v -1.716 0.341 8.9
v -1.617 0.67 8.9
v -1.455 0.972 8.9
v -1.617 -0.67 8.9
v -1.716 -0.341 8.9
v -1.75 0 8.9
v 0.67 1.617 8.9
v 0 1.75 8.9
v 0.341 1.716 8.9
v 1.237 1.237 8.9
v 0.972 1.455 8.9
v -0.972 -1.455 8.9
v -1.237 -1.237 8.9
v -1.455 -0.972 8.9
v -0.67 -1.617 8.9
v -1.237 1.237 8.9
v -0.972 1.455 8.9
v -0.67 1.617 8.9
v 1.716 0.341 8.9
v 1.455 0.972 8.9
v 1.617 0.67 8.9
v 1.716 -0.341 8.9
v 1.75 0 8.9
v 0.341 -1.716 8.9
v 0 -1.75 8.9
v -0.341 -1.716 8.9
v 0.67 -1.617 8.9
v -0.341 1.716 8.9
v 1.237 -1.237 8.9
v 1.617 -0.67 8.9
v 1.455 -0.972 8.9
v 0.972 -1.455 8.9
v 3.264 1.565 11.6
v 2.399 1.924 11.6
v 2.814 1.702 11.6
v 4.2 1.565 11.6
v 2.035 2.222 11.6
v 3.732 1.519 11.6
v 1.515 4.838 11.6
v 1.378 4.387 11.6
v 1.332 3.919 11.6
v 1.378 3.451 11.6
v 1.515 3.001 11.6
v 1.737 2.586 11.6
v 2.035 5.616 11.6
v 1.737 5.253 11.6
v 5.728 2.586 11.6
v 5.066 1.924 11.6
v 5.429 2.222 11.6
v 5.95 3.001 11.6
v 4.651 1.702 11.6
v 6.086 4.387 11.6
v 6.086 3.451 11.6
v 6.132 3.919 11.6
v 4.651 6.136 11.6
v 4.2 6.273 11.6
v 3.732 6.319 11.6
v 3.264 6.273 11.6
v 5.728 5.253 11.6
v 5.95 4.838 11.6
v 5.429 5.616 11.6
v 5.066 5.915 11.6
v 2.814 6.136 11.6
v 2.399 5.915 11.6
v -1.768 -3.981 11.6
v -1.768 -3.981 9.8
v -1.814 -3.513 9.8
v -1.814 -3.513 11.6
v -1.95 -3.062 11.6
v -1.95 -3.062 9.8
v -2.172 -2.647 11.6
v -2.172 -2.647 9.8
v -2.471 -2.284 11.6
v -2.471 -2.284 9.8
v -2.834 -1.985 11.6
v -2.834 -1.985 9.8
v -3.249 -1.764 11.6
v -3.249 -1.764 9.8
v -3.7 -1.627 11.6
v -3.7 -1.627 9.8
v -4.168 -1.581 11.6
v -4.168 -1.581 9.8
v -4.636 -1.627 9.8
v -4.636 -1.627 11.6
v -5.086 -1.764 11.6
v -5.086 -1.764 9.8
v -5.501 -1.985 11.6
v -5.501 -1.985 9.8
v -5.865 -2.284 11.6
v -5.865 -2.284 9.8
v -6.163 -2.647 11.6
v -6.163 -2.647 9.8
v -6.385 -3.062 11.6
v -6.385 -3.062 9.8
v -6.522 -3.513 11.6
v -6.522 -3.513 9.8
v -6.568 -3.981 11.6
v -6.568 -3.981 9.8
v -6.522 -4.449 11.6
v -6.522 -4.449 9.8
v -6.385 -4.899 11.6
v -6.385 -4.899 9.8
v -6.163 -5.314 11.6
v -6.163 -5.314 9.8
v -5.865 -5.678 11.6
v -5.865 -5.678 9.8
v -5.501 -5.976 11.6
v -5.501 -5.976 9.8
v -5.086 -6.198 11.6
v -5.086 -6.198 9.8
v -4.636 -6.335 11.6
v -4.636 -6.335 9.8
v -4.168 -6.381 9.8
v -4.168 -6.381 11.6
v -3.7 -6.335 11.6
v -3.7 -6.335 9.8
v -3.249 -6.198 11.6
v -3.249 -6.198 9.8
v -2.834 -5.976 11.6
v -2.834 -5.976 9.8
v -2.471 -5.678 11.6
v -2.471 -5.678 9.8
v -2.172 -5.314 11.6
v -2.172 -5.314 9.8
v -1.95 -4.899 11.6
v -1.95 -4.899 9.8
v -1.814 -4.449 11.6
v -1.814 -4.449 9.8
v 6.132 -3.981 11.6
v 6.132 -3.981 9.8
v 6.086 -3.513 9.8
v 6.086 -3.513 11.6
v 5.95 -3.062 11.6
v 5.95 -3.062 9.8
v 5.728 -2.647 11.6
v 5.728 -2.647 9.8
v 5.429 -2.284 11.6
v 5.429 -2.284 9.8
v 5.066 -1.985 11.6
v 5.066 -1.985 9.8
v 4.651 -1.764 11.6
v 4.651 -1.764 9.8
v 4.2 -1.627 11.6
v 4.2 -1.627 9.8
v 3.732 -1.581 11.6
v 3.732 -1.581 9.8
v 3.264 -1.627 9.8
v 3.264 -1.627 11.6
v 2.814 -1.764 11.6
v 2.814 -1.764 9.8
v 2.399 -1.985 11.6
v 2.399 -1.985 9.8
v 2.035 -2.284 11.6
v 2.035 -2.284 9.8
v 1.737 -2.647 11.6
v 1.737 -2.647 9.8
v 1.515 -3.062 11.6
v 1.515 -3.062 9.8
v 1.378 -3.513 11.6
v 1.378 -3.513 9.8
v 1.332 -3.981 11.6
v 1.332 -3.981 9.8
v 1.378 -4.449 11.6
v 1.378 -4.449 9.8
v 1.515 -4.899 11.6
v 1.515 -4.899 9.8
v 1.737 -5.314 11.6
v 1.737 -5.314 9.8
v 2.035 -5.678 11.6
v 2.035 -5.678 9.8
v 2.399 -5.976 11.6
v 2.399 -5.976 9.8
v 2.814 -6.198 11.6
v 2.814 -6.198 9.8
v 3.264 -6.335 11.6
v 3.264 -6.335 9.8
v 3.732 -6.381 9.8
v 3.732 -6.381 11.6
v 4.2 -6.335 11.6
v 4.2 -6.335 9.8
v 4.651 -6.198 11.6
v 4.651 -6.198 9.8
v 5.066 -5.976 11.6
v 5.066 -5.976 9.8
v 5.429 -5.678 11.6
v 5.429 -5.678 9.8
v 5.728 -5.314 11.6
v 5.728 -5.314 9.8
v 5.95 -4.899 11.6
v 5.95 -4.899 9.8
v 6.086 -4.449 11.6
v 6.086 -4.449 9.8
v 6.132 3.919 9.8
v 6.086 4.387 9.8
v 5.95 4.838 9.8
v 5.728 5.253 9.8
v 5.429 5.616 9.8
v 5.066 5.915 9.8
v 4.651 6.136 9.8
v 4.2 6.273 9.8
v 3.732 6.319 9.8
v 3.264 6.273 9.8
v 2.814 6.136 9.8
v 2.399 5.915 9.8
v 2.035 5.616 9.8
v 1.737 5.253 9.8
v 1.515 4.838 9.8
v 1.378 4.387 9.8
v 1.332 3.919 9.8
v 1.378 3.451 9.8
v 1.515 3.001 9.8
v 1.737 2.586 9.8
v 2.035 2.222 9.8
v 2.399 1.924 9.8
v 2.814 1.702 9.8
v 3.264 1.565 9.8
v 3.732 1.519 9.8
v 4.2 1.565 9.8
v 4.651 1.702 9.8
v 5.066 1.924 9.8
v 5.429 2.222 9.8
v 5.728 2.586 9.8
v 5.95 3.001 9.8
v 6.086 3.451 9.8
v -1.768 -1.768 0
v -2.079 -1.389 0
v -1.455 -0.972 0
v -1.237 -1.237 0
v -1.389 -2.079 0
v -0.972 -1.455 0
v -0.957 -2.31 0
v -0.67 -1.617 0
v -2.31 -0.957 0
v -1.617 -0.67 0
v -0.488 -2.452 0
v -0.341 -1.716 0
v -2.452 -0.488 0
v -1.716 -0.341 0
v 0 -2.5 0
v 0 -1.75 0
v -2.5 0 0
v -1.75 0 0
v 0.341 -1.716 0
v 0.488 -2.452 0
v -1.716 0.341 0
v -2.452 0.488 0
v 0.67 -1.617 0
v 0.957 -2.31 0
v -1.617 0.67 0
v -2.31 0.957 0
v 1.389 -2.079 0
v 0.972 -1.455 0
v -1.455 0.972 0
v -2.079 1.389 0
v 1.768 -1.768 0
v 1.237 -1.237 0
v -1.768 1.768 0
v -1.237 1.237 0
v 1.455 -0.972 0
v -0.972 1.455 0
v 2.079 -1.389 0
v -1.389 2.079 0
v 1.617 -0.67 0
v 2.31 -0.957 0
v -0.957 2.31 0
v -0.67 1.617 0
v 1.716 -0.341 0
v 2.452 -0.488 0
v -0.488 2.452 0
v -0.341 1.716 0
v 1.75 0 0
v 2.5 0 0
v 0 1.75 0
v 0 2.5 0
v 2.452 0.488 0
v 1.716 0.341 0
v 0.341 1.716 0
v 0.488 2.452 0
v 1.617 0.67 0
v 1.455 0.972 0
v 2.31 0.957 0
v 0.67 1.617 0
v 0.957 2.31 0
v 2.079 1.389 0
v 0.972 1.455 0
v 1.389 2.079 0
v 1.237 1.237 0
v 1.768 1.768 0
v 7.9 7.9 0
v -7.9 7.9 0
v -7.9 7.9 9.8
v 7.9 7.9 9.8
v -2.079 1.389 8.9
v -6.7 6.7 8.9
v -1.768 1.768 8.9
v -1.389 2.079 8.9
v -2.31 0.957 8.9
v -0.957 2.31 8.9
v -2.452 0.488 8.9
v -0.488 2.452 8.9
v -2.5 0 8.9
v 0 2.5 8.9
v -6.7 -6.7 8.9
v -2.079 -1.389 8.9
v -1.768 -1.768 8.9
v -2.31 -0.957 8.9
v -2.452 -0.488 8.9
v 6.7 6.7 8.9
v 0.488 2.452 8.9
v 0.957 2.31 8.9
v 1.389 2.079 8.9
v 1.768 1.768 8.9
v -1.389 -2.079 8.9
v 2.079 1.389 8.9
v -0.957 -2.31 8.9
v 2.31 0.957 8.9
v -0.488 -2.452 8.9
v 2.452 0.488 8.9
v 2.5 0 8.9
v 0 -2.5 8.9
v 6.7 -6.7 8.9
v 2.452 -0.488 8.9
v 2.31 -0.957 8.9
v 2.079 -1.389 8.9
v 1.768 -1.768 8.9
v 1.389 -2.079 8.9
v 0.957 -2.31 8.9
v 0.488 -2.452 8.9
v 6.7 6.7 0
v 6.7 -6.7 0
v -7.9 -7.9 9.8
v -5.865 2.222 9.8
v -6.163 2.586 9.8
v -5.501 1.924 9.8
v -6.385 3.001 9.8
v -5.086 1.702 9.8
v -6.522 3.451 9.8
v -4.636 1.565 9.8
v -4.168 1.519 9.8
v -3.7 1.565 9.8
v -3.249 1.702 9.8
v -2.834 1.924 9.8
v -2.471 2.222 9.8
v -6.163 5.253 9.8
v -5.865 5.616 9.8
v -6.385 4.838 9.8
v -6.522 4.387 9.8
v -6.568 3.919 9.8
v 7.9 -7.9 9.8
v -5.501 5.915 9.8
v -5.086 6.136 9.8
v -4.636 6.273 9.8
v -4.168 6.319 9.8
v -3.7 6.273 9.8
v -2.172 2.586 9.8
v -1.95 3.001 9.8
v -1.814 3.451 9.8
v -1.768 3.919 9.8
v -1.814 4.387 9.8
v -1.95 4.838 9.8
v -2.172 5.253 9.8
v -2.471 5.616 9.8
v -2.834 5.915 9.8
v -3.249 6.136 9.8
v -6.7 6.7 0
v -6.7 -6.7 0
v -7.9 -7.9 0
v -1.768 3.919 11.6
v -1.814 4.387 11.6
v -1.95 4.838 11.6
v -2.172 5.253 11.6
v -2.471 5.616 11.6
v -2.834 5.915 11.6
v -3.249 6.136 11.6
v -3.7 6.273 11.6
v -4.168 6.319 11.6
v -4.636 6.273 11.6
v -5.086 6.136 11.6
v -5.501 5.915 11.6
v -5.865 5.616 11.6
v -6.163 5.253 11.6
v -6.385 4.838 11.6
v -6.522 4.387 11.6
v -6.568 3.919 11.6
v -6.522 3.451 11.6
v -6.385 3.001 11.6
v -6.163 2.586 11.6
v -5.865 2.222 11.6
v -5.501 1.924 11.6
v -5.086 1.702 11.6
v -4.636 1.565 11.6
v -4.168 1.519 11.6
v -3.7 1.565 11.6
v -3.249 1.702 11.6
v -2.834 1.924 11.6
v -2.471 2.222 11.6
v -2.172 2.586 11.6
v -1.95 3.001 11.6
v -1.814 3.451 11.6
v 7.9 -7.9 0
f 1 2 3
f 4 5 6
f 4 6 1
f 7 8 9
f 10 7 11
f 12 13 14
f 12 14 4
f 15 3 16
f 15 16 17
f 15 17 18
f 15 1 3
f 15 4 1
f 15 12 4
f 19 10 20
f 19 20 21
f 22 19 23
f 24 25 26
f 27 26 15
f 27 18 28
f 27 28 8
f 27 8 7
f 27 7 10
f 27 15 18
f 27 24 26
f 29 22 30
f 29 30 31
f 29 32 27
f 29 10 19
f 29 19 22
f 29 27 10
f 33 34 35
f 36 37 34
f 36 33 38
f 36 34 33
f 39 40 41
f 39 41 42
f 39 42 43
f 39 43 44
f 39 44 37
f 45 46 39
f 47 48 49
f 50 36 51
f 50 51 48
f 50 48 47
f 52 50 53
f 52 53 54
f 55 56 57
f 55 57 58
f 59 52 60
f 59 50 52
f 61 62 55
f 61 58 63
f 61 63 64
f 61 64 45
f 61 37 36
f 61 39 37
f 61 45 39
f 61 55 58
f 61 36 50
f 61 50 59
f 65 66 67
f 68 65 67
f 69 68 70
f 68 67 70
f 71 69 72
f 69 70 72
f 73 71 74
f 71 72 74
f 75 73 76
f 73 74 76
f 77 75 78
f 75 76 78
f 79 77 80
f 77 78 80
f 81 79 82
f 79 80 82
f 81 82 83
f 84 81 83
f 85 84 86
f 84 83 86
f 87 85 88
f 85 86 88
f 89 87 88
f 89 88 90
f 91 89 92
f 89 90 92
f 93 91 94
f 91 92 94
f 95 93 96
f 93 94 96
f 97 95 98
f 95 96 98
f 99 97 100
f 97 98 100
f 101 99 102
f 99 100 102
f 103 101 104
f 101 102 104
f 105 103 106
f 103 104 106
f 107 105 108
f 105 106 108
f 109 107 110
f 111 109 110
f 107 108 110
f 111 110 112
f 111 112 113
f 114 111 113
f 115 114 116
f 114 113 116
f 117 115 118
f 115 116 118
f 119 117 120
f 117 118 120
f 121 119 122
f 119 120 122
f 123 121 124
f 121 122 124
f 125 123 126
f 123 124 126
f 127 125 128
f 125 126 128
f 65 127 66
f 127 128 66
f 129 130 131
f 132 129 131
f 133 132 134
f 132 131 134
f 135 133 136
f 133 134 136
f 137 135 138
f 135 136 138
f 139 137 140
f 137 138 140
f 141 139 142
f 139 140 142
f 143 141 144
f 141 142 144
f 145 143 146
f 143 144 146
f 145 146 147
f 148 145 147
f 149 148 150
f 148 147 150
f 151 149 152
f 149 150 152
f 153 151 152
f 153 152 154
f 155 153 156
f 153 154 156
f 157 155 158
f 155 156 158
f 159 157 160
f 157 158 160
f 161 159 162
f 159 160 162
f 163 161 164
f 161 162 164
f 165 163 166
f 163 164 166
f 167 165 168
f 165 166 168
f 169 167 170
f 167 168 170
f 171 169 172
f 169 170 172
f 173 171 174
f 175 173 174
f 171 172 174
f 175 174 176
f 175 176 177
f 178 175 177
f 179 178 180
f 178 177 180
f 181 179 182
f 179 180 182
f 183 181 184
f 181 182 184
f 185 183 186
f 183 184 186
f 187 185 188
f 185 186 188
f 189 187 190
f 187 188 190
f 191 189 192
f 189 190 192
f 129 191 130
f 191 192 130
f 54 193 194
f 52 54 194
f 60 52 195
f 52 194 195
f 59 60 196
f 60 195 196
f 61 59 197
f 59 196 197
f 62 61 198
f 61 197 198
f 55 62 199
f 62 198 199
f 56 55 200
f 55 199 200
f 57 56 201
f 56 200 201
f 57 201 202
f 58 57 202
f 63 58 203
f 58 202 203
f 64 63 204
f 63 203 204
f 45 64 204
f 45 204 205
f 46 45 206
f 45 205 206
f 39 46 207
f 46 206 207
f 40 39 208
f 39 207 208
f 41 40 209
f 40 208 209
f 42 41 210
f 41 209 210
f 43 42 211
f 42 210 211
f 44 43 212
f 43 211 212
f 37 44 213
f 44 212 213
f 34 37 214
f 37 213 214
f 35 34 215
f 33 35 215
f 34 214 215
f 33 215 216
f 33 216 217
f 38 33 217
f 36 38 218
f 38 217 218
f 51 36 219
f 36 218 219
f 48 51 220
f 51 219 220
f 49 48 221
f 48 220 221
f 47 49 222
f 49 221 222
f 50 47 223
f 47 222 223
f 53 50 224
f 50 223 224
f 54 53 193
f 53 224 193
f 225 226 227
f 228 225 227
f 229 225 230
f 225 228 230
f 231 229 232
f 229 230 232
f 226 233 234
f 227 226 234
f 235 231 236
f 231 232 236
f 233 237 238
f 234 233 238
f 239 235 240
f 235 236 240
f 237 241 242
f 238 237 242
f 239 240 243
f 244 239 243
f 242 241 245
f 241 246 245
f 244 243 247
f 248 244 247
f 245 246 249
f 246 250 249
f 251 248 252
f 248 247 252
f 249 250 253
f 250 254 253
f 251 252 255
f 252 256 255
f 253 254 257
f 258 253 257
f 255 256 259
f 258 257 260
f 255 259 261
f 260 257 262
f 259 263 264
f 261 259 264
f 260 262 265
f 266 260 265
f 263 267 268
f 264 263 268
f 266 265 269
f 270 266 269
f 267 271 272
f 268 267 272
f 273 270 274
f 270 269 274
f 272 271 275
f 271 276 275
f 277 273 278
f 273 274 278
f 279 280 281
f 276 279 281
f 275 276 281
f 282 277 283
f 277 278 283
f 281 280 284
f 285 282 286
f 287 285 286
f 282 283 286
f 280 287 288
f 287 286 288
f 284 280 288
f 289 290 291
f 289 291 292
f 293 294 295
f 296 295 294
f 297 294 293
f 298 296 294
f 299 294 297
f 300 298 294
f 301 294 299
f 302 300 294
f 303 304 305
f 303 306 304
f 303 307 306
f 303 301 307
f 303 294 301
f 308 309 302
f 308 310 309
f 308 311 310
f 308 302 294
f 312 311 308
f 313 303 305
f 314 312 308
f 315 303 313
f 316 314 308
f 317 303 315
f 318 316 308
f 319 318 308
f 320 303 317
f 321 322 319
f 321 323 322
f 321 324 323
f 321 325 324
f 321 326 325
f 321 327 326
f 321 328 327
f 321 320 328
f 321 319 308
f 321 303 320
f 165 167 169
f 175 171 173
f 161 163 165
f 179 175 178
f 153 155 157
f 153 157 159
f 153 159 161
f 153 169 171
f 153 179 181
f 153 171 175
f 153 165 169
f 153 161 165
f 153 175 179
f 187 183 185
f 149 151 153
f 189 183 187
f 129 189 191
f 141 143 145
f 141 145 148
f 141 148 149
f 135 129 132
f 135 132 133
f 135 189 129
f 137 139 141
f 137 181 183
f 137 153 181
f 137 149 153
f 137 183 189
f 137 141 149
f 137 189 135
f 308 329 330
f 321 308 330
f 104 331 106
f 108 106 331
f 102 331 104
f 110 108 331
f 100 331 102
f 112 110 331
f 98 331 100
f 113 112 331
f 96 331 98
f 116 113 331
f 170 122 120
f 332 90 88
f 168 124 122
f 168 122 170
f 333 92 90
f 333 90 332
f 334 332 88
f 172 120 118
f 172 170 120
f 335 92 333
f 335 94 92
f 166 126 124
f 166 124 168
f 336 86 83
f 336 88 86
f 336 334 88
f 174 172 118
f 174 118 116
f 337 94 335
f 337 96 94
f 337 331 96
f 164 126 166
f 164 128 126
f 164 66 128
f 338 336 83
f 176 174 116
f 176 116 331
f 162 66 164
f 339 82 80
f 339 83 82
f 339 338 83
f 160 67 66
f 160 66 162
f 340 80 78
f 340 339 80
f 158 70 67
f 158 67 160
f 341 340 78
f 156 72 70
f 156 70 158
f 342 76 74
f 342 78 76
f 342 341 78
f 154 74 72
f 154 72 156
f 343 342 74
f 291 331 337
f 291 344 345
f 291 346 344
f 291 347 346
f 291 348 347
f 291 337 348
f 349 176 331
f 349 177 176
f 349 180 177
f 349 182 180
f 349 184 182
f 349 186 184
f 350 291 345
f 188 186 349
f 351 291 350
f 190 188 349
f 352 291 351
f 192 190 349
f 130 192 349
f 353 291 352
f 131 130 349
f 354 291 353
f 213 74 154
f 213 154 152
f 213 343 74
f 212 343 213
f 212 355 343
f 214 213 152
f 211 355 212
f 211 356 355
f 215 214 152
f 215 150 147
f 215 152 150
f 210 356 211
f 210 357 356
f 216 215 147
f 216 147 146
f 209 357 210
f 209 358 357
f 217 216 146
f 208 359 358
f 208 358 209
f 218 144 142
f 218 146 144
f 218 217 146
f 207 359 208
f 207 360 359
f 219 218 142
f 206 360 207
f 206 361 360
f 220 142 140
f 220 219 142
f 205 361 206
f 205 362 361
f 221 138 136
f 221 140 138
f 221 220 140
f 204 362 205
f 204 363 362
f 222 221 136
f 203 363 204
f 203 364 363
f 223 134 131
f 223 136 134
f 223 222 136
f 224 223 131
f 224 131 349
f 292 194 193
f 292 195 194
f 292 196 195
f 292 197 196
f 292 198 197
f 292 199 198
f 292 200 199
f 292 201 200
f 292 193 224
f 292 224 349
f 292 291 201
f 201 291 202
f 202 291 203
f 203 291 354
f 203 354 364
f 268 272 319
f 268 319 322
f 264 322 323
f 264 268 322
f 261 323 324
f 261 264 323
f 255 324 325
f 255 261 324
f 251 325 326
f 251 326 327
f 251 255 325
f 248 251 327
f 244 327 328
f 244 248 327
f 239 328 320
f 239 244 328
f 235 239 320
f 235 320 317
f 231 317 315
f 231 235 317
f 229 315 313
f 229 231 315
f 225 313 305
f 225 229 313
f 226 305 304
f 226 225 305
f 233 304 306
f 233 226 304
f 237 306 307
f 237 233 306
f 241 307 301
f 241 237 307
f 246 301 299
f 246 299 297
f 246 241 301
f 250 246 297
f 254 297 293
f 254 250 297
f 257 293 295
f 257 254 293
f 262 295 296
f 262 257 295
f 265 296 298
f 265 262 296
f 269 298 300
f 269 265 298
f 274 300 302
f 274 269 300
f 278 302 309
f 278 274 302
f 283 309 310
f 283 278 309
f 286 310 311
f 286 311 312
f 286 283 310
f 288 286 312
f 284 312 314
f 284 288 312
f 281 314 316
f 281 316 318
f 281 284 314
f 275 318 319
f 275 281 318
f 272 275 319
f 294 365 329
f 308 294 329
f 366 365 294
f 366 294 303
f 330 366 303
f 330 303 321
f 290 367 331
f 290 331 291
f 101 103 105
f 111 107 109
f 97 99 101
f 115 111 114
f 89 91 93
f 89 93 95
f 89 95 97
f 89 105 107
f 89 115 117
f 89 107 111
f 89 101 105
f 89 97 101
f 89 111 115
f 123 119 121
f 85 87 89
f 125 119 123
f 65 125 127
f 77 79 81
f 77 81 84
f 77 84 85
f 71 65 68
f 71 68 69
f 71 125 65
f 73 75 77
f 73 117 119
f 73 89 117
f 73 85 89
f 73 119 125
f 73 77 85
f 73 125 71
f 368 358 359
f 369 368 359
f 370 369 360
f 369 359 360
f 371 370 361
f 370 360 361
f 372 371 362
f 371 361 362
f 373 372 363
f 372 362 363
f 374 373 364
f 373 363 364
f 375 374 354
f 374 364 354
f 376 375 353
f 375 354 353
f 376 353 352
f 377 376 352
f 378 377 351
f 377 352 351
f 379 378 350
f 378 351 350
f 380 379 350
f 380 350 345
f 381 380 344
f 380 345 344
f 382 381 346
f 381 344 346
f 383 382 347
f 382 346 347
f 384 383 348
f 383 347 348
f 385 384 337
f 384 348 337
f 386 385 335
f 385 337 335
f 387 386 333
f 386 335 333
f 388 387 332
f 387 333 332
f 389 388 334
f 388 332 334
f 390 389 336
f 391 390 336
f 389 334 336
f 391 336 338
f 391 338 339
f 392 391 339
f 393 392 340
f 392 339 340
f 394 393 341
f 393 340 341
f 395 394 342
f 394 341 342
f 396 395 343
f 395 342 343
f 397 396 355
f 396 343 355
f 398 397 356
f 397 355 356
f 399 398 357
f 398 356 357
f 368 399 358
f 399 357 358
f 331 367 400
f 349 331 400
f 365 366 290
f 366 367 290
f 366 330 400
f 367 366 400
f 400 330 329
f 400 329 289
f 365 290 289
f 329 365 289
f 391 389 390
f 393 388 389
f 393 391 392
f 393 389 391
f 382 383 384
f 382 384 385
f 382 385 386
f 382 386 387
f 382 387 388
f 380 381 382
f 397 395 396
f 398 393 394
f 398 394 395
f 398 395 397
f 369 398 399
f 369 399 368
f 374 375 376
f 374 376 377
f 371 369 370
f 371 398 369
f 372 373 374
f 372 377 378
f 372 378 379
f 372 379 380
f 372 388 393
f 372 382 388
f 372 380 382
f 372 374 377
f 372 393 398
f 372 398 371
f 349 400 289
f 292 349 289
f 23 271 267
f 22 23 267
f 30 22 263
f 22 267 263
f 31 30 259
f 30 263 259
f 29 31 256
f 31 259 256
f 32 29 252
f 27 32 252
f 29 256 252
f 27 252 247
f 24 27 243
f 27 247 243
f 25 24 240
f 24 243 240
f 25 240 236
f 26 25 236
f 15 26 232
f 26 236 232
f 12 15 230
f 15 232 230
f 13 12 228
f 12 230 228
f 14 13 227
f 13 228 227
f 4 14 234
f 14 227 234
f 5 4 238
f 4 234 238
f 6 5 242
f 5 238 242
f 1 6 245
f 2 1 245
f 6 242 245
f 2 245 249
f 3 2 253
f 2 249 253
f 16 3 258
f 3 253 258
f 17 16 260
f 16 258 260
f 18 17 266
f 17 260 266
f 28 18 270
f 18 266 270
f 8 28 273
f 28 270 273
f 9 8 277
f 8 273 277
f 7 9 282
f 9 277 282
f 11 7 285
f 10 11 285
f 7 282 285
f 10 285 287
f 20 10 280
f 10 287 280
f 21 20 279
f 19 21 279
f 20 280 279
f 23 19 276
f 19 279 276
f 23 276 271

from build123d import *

# Parameters (mm, degrees)
F0_W     = 15.8
F0_H     = 15.8
F1_DEPTH = 9.8
F2_R     = 2.4
F3_DEPTH = 1.8
F4_W     = 13.4
F4_H     = 13.4
F4_R     = 2.5
F4_R_2   = 1.75
F5_DEPTH = 8.9


with BuildPart() as f1:
    # F0 (on Top) → F1 (new body)
    with BuildSketch(Plane.XY):
        Rectangle(F0_W, F0_H)
    extrude(amount=F1_DEPTH)

    # F2 (on face) → F3 (join)
    with BuildSketch(Plane.XY.offset(9.8)):
        with Locations((-4.167743, 3.919162)):
            Circle(F2_R)
        with Locations((3.732257, 3.919162)):
            Circle(F2_R)
        with Locations((3.732257, -3.980838)):
            Circle(F2_R)
        with Locations((-4.167743, -3.980838)):
            Circle(F2_R)
    extrude(amount=F3_DEPTH)

    # F4 (on face) → F5 (cut)
    with BuildSketch(Plane(origin=(0, 0, 0), x_dir=(1, 0, 0), z_dir=(0, 0, -1))):
        Rectangle(F4_W, F4_H)
        Circle(F4_R, mode=Mode.SUBTRACT)
        Circle(F4_R_2)
    extrude(amount=-F5_DEPTH, mode=Mode.SUBTRACT)


solid = f1.part
